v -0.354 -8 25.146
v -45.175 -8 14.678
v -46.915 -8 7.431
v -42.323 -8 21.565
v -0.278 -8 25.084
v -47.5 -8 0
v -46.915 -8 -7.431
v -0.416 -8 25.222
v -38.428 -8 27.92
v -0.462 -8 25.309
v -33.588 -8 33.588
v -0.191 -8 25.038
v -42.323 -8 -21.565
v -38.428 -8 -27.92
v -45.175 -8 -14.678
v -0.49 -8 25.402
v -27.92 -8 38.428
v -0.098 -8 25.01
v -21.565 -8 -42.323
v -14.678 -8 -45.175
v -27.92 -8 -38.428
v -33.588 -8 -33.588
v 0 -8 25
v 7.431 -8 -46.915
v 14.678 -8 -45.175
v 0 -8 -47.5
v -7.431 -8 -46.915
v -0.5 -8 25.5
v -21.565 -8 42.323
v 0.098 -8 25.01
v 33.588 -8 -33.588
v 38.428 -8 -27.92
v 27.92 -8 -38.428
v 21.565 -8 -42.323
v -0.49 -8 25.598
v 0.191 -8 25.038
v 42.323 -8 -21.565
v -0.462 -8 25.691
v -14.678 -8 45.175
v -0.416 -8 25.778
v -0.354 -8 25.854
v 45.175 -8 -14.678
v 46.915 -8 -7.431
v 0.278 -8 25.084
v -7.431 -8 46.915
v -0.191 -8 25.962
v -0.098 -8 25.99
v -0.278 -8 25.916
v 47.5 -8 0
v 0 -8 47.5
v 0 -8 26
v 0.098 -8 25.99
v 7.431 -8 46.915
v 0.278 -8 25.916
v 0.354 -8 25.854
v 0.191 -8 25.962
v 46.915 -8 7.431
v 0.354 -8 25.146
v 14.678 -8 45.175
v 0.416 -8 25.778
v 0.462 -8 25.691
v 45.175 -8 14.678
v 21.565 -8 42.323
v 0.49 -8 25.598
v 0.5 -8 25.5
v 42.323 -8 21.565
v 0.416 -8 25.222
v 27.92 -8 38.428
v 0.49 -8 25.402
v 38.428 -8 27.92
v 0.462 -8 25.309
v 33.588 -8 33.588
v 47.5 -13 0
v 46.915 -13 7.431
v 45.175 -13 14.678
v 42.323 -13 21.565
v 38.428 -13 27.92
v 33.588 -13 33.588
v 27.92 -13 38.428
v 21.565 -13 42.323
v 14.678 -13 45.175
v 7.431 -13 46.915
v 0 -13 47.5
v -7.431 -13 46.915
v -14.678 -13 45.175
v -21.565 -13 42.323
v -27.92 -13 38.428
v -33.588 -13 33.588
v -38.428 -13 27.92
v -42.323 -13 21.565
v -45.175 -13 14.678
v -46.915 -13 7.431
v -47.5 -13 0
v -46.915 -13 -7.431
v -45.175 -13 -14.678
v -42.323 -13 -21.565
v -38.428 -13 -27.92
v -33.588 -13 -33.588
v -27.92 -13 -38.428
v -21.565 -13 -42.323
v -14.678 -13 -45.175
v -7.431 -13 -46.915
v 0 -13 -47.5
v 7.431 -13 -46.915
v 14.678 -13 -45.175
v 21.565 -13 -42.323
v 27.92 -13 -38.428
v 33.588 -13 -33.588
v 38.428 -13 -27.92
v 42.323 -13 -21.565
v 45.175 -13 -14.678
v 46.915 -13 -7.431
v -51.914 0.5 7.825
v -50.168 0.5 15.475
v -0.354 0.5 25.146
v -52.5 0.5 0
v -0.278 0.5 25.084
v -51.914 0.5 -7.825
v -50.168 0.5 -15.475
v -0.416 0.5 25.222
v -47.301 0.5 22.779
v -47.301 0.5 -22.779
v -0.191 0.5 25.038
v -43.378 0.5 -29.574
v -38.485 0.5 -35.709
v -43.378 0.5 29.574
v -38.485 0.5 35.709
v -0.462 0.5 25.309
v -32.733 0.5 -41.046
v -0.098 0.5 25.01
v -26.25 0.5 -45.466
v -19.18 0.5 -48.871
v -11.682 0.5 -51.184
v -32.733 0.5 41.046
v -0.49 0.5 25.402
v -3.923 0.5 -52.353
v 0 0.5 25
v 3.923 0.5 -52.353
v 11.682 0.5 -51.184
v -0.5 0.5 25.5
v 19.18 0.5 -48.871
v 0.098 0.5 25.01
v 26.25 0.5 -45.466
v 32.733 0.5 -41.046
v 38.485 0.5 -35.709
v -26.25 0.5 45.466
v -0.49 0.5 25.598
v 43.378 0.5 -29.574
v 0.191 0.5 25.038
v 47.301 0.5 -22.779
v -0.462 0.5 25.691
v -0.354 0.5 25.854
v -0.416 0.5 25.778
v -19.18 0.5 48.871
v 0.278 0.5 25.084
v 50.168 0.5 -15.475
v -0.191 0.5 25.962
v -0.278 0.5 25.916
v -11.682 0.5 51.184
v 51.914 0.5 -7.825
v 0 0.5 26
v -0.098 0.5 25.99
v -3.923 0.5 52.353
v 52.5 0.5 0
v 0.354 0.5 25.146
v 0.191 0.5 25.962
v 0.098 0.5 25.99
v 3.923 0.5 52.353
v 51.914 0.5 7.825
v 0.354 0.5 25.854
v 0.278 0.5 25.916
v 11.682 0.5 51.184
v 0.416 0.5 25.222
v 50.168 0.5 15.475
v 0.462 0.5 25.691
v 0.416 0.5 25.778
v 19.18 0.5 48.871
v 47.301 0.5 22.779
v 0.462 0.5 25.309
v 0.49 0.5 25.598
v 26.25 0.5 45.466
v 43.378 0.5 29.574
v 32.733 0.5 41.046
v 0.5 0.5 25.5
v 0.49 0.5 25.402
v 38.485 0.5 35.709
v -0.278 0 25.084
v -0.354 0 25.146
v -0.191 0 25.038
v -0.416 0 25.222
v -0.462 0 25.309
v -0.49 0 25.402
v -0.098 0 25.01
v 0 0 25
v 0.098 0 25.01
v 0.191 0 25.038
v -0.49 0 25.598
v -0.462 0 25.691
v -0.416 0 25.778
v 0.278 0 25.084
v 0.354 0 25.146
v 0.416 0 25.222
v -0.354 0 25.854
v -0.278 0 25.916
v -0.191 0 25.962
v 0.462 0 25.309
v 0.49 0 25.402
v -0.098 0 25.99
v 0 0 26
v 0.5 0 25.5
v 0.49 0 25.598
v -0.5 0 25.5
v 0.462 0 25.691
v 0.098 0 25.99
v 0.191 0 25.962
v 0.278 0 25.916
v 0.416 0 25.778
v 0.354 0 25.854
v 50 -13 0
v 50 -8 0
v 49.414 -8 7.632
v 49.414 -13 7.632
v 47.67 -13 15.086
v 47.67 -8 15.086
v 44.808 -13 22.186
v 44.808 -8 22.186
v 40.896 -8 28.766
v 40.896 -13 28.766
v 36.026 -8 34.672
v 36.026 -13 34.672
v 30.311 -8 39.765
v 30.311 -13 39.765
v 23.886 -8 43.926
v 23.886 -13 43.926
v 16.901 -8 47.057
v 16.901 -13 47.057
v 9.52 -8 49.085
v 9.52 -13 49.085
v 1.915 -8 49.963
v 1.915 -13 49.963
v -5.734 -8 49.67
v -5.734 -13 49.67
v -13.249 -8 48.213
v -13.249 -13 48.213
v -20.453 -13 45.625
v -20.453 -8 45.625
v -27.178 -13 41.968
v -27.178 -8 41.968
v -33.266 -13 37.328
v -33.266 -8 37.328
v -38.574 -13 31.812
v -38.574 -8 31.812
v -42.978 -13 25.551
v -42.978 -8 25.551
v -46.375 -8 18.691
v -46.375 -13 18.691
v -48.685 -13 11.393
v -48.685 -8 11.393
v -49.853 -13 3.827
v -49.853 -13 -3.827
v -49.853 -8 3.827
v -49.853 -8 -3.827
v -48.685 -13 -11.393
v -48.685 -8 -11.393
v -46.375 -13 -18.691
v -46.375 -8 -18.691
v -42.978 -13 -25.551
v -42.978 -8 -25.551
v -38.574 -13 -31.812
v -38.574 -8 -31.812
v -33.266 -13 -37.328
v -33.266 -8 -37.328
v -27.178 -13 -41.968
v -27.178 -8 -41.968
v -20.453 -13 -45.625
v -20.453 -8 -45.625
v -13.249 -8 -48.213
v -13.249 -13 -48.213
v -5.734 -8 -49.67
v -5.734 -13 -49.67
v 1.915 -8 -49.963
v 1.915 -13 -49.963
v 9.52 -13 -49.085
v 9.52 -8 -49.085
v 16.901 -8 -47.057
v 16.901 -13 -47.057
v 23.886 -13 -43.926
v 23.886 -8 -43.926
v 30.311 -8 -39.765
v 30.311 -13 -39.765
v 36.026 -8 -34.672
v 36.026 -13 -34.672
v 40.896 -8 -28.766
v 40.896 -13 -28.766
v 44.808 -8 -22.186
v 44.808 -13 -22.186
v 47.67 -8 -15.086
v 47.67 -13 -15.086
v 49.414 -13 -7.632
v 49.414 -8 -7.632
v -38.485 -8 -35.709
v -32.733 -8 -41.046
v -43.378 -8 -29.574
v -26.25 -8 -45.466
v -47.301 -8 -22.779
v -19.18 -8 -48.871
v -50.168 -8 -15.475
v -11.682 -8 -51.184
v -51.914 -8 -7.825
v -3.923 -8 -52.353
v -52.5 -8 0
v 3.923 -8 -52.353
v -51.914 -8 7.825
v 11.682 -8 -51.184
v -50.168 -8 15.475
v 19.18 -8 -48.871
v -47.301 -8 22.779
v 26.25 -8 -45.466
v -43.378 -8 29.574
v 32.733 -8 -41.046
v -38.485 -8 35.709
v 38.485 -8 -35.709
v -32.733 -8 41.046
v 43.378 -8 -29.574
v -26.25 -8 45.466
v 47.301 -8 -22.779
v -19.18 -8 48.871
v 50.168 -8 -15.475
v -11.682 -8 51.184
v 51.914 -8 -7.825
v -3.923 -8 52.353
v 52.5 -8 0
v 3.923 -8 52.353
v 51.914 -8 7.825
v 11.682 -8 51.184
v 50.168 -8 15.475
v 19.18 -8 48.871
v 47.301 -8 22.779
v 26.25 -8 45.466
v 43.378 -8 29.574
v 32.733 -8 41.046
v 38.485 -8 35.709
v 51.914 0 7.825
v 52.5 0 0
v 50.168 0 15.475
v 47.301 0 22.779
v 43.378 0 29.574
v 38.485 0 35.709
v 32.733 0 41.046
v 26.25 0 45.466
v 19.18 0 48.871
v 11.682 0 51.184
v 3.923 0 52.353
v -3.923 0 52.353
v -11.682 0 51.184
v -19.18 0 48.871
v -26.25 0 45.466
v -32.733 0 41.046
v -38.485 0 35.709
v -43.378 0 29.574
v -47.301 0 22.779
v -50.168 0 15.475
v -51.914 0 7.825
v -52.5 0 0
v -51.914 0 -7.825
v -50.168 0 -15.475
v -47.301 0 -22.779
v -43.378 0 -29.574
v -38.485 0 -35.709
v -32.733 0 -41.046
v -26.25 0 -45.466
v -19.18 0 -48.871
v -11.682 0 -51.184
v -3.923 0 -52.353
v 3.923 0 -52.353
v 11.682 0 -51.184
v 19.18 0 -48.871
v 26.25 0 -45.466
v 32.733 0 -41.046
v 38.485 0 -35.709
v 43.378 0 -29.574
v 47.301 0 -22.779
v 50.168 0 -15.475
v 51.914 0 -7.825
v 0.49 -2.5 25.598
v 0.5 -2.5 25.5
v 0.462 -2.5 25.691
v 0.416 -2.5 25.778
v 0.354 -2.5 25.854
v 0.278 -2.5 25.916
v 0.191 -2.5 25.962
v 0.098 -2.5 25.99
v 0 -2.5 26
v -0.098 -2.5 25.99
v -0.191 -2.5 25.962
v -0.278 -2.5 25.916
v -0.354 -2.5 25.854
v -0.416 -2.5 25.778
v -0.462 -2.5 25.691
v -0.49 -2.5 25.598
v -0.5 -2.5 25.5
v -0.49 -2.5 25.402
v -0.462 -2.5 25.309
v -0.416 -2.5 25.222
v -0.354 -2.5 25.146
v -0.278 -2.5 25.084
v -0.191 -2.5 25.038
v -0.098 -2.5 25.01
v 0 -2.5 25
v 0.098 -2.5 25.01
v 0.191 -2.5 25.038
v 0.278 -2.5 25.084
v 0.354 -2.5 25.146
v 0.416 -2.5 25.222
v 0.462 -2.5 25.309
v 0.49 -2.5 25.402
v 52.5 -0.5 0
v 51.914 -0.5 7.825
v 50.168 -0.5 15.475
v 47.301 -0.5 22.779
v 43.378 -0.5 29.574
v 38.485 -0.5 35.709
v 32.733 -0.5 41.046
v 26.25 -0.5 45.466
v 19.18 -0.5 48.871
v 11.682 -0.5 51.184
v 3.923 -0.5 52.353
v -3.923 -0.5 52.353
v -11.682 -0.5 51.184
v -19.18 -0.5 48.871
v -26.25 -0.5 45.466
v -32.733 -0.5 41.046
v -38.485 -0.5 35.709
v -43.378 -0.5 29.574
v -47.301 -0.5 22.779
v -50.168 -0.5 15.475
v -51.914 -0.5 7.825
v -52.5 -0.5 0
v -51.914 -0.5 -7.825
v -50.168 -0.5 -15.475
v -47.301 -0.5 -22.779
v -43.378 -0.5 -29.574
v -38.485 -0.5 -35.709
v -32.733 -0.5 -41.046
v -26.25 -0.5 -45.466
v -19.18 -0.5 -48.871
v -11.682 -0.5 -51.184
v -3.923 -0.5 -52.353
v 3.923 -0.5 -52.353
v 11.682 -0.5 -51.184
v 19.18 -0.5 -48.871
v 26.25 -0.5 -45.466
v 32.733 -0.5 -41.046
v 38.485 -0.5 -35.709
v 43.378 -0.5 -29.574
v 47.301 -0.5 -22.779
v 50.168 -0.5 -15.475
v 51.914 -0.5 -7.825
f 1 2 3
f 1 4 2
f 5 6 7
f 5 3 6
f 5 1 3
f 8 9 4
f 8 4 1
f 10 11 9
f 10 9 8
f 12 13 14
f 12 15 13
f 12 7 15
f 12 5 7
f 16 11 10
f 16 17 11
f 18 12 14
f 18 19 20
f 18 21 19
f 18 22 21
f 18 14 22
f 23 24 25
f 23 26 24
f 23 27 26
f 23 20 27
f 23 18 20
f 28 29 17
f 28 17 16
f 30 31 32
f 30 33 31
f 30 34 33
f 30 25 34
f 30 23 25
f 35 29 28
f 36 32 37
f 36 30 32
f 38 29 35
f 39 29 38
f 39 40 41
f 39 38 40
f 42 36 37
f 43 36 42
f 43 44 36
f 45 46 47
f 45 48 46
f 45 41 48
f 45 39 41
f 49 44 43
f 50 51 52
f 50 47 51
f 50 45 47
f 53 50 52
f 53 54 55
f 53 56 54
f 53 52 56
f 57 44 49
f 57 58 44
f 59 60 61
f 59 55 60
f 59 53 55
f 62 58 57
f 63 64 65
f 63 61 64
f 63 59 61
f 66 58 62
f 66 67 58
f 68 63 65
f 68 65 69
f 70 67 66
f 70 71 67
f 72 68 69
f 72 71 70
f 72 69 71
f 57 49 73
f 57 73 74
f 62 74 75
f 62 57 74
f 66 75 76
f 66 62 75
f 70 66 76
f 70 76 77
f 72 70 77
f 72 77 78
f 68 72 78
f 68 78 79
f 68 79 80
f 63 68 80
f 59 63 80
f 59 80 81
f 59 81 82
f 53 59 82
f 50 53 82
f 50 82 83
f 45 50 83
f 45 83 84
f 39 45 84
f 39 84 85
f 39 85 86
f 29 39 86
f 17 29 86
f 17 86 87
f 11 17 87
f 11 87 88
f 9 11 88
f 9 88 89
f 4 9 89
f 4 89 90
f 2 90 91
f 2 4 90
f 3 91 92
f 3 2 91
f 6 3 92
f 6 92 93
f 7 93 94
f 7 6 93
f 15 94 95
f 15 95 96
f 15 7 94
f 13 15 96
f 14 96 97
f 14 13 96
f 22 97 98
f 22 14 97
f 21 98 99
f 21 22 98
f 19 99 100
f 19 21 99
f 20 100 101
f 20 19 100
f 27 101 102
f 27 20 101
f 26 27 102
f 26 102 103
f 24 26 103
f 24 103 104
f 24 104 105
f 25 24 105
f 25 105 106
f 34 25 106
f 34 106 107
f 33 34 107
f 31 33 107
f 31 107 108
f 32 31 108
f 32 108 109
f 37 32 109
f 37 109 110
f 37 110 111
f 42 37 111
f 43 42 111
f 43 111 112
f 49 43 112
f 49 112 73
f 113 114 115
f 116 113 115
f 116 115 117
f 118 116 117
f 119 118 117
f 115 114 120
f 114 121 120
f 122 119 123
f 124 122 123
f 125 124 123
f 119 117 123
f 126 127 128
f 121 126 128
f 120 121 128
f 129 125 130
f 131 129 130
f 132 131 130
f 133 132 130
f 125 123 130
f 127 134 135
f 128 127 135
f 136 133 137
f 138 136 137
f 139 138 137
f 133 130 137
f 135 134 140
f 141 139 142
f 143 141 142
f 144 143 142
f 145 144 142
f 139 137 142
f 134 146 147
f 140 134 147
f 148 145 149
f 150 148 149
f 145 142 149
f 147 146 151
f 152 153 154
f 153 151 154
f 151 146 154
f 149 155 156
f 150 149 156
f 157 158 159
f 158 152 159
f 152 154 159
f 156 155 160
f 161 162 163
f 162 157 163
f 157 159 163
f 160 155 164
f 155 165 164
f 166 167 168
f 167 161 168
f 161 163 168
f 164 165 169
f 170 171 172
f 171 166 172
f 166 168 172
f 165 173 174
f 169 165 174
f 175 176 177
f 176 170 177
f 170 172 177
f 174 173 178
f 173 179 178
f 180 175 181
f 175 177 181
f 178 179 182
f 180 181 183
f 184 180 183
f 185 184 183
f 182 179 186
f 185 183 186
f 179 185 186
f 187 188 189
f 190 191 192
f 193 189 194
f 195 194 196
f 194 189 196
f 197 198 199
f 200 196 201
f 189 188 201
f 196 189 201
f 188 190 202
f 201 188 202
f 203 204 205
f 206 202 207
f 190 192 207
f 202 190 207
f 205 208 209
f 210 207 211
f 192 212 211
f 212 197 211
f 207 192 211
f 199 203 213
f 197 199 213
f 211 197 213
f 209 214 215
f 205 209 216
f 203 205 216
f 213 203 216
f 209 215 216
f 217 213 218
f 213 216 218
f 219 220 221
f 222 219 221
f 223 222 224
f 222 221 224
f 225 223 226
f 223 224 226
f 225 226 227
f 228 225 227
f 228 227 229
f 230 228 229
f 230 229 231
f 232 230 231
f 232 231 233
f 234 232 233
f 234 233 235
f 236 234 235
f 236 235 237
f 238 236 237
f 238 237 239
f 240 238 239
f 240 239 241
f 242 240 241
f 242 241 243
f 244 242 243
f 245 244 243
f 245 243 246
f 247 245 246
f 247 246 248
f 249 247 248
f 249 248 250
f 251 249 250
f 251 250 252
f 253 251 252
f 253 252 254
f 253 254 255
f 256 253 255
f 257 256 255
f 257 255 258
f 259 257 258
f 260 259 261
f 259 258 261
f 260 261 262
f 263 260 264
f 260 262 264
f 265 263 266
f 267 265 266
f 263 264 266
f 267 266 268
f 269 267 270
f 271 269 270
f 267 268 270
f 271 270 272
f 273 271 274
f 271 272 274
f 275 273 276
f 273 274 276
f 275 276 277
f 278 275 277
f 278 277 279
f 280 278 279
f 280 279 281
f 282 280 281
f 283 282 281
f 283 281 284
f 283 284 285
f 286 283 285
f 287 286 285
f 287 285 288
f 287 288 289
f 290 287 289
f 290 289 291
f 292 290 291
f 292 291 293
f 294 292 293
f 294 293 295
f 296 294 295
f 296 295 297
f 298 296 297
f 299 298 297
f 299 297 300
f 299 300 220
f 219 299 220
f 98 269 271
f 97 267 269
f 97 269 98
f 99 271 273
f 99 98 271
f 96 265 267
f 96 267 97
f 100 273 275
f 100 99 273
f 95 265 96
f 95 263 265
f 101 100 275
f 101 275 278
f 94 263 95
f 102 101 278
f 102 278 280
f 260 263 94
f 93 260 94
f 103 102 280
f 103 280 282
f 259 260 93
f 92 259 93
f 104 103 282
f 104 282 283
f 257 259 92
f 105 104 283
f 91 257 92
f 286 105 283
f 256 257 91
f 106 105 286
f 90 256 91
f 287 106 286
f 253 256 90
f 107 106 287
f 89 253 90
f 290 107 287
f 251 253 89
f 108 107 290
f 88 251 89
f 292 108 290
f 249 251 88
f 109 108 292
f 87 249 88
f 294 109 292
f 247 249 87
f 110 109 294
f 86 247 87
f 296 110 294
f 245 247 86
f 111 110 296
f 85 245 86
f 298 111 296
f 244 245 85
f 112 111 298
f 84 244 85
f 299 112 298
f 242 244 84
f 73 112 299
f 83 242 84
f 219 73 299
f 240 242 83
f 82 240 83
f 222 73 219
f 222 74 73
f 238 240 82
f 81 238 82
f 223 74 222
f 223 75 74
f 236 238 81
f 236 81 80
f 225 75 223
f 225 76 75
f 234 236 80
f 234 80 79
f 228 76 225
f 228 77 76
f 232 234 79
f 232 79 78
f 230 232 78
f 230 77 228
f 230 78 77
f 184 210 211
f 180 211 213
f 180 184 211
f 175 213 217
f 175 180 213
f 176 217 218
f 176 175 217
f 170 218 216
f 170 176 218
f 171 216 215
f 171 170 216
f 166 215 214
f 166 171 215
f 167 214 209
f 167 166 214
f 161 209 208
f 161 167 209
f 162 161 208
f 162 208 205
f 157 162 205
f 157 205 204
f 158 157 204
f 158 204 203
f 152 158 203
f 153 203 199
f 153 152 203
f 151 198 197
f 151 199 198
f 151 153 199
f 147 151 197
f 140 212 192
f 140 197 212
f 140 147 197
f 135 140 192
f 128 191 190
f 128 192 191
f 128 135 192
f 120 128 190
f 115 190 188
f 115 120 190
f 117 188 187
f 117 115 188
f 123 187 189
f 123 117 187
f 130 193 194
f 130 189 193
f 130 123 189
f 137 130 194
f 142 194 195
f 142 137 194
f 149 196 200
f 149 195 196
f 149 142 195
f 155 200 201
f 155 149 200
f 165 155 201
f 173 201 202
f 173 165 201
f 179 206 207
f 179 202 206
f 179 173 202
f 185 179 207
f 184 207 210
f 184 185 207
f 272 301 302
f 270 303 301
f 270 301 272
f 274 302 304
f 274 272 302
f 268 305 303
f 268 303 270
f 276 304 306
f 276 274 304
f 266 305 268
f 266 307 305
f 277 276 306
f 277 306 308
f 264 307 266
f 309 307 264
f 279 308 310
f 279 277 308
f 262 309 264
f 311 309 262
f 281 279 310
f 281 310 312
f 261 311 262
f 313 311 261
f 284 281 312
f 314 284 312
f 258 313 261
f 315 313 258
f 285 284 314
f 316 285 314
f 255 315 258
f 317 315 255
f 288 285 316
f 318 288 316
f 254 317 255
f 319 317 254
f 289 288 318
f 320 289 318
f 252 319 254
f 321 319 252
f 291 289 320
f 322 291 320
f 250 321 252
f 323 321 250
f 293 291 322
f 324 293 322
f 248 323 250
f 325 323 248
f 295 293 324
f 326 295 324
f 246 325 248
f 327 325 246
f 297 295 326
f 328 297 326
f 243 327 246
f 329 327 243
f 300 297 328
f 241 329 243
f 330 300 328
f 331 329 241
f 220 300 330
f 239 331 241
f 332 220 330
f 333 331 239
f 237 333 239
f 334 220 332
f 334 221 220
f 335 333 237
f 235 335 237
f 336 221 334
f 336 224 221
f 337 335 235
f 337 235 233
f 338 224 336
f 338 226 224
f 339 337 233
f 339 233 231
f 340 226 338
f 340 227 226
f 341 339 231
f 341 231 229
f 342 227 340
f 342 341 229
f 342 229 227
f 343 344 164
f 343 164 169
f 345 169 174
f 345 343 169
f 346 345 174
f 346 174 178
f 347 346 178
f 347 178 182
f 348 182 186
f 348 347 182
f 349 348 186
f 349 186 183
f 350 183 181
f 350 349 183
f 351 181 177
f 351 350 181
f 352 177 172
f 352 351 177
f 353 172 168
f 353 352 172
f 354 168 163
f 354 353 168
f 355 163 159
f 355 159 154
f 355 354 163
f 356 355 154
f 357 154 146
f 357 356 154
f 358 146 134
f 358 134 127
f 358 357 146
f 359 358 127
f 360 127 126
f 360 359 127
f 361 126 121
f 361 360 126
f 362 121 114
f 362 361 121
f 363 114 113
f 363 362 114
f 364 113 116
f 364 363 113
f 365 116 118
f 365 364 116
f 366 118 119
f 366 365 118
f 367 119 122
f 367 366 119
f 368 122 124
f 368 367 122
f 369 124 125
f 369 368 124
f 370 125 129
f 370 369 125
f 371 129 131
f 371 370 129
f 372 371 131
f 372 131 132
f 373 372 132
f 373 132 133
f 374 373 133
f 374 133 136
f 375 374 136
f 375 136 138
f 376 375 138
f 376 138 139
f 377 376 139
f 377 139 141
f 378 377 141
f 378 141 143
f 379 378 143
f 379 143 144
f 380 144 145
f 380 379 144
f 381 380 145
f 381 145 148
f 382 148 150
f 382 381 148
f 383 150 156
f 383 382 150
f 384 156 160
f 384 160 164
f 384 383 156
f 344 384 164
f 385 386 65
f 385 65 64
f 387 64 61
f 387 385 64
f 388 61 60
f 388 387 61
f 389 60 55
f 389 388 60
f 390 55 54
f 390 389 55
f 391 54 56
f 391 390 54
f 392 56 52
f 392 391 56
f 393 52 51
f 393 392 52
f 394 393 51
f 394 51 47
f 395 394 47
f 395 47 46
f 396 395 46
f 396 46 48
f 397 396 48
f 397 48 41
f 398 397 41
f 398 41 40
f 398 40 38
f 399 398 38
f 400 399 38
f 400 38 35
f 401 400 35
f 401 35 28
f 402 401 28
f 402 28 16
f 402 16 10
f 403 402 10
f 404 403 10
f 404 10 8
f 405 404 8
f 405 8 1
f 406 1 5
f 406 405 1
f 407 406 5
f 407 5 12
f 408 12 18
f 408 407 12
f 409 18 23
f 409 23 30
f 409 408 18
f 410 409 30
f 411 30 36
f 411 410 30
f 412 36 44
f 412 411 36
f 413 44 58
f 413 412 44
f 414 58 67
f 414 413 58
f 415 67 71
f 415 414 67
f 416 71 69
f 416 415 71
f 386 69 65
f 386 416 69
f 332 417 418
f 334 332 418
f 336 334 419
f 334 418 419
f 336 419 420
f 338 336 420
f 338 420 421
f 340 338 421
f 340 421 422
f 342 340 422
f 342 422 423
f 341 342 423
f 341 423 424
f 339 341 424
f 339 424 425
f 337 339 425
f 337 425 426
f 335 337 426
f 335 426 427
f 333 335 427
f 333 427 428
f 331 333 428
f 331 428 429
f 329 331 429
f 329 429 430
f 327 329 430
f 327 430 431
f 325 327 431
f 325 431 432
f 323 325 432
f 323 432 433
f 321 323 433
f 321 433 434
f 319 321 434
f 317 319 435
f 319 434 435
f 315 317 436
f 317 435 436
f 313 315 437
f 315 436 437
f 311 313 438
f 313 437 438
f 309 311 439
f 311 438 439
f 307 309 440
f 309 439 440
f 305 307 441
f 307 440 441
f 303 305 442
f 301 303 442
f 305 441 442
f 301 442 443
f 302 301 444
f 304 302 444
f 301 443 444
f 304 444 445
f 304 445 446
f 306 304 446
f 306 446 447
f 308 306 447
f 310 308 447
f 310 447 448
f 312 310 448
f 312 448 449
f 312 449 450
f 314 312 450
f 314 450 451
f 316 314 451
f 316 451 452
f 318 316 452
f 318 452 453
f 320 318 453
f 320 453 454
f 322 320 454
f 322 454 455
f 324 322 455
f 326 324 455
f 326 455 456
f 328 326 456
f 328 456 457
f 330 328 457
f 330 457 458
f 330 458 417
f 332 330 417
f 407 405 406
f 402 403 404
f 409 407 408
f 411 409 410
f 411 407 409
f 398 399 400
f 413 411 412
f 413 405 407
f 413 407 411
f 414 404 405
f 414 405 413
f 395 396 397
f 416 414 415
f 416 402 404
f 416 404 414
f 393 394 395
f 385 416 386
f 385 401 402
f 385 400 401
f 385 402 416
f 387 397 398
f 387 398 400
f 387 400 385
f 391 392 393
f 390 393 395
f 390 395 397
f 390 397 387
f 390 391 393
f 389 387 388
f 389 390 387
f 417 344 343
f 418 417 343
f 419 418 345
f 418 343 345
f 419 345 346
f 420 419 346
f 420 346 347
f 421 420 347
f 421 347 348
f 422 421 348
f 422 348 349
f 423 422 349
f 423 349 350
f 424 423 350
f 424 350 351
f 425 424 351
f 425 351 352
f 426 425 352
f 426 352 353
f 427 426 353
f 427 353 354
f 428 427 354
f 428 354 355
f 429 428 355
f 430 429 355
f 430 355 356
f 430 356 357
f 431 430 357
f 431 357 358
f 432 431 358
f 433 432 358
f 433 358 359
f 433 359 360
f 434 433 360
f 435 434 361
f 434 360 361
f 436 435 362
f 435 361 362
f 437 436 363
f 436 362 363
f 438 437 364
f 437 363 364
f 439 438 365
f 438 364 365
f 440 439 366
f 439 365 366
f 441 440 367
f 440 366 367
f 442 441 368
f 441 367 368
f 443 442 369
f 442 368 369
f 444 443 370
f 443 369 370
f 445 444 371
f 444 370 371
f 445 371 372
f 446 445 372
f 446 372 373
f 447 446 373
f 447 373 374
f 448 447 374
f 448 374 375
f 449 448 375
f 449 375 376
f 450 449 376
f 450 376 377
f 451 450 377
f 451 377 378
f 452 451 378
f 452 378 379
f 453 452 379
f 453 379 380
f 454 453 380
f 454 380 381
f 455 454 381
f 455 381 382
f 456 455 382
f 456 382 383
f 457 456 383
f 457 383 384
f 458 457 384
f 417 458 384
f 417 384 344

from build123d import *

# Parameters (mm, degrees)
F0_R     = 50
F1_DEPTH = 13
F2_T     = -2.5
F3_R     = 52.5
F3_R_2   = 0.5
F4_DEPTH = 8
F5_DEPTH = 0.5


with BuildPart() as f1:
    # F0 (on Front) → F1 (new body)
    with BuildSketch(Plane.XZ):
        Circle(F0_R)
    extrude(amount=F1_DEPTH)

    # F2
    f2_openings = [f1.faces().sort_by_distance(p)[0] for p in [
        (0, -13, 0),
    ]]
    offset(amount=F2_T, openings=f2_openings)

    # F3 (on Front) → F4 (join)
    with BuildSketch(Plane.XZ):
        Circle(F3_R)
        with Locations((0, 25.5)):
            Circle(F3_R_2, mode=Mode.SUBTRACT)
    extrude(amount=F4_DEPTH)

    # F3 (on Front) → F5 (join, symmetric)
    with BuildSketch(Plane.XZ):
        Circle(F3_R)
        with Locations((0, 25.5)):
            Circle(F3_R_2, mode=Mode.SUBTRACT)
    extrude(amount=F5_DEPTH, both=True)


solid = f1.part
